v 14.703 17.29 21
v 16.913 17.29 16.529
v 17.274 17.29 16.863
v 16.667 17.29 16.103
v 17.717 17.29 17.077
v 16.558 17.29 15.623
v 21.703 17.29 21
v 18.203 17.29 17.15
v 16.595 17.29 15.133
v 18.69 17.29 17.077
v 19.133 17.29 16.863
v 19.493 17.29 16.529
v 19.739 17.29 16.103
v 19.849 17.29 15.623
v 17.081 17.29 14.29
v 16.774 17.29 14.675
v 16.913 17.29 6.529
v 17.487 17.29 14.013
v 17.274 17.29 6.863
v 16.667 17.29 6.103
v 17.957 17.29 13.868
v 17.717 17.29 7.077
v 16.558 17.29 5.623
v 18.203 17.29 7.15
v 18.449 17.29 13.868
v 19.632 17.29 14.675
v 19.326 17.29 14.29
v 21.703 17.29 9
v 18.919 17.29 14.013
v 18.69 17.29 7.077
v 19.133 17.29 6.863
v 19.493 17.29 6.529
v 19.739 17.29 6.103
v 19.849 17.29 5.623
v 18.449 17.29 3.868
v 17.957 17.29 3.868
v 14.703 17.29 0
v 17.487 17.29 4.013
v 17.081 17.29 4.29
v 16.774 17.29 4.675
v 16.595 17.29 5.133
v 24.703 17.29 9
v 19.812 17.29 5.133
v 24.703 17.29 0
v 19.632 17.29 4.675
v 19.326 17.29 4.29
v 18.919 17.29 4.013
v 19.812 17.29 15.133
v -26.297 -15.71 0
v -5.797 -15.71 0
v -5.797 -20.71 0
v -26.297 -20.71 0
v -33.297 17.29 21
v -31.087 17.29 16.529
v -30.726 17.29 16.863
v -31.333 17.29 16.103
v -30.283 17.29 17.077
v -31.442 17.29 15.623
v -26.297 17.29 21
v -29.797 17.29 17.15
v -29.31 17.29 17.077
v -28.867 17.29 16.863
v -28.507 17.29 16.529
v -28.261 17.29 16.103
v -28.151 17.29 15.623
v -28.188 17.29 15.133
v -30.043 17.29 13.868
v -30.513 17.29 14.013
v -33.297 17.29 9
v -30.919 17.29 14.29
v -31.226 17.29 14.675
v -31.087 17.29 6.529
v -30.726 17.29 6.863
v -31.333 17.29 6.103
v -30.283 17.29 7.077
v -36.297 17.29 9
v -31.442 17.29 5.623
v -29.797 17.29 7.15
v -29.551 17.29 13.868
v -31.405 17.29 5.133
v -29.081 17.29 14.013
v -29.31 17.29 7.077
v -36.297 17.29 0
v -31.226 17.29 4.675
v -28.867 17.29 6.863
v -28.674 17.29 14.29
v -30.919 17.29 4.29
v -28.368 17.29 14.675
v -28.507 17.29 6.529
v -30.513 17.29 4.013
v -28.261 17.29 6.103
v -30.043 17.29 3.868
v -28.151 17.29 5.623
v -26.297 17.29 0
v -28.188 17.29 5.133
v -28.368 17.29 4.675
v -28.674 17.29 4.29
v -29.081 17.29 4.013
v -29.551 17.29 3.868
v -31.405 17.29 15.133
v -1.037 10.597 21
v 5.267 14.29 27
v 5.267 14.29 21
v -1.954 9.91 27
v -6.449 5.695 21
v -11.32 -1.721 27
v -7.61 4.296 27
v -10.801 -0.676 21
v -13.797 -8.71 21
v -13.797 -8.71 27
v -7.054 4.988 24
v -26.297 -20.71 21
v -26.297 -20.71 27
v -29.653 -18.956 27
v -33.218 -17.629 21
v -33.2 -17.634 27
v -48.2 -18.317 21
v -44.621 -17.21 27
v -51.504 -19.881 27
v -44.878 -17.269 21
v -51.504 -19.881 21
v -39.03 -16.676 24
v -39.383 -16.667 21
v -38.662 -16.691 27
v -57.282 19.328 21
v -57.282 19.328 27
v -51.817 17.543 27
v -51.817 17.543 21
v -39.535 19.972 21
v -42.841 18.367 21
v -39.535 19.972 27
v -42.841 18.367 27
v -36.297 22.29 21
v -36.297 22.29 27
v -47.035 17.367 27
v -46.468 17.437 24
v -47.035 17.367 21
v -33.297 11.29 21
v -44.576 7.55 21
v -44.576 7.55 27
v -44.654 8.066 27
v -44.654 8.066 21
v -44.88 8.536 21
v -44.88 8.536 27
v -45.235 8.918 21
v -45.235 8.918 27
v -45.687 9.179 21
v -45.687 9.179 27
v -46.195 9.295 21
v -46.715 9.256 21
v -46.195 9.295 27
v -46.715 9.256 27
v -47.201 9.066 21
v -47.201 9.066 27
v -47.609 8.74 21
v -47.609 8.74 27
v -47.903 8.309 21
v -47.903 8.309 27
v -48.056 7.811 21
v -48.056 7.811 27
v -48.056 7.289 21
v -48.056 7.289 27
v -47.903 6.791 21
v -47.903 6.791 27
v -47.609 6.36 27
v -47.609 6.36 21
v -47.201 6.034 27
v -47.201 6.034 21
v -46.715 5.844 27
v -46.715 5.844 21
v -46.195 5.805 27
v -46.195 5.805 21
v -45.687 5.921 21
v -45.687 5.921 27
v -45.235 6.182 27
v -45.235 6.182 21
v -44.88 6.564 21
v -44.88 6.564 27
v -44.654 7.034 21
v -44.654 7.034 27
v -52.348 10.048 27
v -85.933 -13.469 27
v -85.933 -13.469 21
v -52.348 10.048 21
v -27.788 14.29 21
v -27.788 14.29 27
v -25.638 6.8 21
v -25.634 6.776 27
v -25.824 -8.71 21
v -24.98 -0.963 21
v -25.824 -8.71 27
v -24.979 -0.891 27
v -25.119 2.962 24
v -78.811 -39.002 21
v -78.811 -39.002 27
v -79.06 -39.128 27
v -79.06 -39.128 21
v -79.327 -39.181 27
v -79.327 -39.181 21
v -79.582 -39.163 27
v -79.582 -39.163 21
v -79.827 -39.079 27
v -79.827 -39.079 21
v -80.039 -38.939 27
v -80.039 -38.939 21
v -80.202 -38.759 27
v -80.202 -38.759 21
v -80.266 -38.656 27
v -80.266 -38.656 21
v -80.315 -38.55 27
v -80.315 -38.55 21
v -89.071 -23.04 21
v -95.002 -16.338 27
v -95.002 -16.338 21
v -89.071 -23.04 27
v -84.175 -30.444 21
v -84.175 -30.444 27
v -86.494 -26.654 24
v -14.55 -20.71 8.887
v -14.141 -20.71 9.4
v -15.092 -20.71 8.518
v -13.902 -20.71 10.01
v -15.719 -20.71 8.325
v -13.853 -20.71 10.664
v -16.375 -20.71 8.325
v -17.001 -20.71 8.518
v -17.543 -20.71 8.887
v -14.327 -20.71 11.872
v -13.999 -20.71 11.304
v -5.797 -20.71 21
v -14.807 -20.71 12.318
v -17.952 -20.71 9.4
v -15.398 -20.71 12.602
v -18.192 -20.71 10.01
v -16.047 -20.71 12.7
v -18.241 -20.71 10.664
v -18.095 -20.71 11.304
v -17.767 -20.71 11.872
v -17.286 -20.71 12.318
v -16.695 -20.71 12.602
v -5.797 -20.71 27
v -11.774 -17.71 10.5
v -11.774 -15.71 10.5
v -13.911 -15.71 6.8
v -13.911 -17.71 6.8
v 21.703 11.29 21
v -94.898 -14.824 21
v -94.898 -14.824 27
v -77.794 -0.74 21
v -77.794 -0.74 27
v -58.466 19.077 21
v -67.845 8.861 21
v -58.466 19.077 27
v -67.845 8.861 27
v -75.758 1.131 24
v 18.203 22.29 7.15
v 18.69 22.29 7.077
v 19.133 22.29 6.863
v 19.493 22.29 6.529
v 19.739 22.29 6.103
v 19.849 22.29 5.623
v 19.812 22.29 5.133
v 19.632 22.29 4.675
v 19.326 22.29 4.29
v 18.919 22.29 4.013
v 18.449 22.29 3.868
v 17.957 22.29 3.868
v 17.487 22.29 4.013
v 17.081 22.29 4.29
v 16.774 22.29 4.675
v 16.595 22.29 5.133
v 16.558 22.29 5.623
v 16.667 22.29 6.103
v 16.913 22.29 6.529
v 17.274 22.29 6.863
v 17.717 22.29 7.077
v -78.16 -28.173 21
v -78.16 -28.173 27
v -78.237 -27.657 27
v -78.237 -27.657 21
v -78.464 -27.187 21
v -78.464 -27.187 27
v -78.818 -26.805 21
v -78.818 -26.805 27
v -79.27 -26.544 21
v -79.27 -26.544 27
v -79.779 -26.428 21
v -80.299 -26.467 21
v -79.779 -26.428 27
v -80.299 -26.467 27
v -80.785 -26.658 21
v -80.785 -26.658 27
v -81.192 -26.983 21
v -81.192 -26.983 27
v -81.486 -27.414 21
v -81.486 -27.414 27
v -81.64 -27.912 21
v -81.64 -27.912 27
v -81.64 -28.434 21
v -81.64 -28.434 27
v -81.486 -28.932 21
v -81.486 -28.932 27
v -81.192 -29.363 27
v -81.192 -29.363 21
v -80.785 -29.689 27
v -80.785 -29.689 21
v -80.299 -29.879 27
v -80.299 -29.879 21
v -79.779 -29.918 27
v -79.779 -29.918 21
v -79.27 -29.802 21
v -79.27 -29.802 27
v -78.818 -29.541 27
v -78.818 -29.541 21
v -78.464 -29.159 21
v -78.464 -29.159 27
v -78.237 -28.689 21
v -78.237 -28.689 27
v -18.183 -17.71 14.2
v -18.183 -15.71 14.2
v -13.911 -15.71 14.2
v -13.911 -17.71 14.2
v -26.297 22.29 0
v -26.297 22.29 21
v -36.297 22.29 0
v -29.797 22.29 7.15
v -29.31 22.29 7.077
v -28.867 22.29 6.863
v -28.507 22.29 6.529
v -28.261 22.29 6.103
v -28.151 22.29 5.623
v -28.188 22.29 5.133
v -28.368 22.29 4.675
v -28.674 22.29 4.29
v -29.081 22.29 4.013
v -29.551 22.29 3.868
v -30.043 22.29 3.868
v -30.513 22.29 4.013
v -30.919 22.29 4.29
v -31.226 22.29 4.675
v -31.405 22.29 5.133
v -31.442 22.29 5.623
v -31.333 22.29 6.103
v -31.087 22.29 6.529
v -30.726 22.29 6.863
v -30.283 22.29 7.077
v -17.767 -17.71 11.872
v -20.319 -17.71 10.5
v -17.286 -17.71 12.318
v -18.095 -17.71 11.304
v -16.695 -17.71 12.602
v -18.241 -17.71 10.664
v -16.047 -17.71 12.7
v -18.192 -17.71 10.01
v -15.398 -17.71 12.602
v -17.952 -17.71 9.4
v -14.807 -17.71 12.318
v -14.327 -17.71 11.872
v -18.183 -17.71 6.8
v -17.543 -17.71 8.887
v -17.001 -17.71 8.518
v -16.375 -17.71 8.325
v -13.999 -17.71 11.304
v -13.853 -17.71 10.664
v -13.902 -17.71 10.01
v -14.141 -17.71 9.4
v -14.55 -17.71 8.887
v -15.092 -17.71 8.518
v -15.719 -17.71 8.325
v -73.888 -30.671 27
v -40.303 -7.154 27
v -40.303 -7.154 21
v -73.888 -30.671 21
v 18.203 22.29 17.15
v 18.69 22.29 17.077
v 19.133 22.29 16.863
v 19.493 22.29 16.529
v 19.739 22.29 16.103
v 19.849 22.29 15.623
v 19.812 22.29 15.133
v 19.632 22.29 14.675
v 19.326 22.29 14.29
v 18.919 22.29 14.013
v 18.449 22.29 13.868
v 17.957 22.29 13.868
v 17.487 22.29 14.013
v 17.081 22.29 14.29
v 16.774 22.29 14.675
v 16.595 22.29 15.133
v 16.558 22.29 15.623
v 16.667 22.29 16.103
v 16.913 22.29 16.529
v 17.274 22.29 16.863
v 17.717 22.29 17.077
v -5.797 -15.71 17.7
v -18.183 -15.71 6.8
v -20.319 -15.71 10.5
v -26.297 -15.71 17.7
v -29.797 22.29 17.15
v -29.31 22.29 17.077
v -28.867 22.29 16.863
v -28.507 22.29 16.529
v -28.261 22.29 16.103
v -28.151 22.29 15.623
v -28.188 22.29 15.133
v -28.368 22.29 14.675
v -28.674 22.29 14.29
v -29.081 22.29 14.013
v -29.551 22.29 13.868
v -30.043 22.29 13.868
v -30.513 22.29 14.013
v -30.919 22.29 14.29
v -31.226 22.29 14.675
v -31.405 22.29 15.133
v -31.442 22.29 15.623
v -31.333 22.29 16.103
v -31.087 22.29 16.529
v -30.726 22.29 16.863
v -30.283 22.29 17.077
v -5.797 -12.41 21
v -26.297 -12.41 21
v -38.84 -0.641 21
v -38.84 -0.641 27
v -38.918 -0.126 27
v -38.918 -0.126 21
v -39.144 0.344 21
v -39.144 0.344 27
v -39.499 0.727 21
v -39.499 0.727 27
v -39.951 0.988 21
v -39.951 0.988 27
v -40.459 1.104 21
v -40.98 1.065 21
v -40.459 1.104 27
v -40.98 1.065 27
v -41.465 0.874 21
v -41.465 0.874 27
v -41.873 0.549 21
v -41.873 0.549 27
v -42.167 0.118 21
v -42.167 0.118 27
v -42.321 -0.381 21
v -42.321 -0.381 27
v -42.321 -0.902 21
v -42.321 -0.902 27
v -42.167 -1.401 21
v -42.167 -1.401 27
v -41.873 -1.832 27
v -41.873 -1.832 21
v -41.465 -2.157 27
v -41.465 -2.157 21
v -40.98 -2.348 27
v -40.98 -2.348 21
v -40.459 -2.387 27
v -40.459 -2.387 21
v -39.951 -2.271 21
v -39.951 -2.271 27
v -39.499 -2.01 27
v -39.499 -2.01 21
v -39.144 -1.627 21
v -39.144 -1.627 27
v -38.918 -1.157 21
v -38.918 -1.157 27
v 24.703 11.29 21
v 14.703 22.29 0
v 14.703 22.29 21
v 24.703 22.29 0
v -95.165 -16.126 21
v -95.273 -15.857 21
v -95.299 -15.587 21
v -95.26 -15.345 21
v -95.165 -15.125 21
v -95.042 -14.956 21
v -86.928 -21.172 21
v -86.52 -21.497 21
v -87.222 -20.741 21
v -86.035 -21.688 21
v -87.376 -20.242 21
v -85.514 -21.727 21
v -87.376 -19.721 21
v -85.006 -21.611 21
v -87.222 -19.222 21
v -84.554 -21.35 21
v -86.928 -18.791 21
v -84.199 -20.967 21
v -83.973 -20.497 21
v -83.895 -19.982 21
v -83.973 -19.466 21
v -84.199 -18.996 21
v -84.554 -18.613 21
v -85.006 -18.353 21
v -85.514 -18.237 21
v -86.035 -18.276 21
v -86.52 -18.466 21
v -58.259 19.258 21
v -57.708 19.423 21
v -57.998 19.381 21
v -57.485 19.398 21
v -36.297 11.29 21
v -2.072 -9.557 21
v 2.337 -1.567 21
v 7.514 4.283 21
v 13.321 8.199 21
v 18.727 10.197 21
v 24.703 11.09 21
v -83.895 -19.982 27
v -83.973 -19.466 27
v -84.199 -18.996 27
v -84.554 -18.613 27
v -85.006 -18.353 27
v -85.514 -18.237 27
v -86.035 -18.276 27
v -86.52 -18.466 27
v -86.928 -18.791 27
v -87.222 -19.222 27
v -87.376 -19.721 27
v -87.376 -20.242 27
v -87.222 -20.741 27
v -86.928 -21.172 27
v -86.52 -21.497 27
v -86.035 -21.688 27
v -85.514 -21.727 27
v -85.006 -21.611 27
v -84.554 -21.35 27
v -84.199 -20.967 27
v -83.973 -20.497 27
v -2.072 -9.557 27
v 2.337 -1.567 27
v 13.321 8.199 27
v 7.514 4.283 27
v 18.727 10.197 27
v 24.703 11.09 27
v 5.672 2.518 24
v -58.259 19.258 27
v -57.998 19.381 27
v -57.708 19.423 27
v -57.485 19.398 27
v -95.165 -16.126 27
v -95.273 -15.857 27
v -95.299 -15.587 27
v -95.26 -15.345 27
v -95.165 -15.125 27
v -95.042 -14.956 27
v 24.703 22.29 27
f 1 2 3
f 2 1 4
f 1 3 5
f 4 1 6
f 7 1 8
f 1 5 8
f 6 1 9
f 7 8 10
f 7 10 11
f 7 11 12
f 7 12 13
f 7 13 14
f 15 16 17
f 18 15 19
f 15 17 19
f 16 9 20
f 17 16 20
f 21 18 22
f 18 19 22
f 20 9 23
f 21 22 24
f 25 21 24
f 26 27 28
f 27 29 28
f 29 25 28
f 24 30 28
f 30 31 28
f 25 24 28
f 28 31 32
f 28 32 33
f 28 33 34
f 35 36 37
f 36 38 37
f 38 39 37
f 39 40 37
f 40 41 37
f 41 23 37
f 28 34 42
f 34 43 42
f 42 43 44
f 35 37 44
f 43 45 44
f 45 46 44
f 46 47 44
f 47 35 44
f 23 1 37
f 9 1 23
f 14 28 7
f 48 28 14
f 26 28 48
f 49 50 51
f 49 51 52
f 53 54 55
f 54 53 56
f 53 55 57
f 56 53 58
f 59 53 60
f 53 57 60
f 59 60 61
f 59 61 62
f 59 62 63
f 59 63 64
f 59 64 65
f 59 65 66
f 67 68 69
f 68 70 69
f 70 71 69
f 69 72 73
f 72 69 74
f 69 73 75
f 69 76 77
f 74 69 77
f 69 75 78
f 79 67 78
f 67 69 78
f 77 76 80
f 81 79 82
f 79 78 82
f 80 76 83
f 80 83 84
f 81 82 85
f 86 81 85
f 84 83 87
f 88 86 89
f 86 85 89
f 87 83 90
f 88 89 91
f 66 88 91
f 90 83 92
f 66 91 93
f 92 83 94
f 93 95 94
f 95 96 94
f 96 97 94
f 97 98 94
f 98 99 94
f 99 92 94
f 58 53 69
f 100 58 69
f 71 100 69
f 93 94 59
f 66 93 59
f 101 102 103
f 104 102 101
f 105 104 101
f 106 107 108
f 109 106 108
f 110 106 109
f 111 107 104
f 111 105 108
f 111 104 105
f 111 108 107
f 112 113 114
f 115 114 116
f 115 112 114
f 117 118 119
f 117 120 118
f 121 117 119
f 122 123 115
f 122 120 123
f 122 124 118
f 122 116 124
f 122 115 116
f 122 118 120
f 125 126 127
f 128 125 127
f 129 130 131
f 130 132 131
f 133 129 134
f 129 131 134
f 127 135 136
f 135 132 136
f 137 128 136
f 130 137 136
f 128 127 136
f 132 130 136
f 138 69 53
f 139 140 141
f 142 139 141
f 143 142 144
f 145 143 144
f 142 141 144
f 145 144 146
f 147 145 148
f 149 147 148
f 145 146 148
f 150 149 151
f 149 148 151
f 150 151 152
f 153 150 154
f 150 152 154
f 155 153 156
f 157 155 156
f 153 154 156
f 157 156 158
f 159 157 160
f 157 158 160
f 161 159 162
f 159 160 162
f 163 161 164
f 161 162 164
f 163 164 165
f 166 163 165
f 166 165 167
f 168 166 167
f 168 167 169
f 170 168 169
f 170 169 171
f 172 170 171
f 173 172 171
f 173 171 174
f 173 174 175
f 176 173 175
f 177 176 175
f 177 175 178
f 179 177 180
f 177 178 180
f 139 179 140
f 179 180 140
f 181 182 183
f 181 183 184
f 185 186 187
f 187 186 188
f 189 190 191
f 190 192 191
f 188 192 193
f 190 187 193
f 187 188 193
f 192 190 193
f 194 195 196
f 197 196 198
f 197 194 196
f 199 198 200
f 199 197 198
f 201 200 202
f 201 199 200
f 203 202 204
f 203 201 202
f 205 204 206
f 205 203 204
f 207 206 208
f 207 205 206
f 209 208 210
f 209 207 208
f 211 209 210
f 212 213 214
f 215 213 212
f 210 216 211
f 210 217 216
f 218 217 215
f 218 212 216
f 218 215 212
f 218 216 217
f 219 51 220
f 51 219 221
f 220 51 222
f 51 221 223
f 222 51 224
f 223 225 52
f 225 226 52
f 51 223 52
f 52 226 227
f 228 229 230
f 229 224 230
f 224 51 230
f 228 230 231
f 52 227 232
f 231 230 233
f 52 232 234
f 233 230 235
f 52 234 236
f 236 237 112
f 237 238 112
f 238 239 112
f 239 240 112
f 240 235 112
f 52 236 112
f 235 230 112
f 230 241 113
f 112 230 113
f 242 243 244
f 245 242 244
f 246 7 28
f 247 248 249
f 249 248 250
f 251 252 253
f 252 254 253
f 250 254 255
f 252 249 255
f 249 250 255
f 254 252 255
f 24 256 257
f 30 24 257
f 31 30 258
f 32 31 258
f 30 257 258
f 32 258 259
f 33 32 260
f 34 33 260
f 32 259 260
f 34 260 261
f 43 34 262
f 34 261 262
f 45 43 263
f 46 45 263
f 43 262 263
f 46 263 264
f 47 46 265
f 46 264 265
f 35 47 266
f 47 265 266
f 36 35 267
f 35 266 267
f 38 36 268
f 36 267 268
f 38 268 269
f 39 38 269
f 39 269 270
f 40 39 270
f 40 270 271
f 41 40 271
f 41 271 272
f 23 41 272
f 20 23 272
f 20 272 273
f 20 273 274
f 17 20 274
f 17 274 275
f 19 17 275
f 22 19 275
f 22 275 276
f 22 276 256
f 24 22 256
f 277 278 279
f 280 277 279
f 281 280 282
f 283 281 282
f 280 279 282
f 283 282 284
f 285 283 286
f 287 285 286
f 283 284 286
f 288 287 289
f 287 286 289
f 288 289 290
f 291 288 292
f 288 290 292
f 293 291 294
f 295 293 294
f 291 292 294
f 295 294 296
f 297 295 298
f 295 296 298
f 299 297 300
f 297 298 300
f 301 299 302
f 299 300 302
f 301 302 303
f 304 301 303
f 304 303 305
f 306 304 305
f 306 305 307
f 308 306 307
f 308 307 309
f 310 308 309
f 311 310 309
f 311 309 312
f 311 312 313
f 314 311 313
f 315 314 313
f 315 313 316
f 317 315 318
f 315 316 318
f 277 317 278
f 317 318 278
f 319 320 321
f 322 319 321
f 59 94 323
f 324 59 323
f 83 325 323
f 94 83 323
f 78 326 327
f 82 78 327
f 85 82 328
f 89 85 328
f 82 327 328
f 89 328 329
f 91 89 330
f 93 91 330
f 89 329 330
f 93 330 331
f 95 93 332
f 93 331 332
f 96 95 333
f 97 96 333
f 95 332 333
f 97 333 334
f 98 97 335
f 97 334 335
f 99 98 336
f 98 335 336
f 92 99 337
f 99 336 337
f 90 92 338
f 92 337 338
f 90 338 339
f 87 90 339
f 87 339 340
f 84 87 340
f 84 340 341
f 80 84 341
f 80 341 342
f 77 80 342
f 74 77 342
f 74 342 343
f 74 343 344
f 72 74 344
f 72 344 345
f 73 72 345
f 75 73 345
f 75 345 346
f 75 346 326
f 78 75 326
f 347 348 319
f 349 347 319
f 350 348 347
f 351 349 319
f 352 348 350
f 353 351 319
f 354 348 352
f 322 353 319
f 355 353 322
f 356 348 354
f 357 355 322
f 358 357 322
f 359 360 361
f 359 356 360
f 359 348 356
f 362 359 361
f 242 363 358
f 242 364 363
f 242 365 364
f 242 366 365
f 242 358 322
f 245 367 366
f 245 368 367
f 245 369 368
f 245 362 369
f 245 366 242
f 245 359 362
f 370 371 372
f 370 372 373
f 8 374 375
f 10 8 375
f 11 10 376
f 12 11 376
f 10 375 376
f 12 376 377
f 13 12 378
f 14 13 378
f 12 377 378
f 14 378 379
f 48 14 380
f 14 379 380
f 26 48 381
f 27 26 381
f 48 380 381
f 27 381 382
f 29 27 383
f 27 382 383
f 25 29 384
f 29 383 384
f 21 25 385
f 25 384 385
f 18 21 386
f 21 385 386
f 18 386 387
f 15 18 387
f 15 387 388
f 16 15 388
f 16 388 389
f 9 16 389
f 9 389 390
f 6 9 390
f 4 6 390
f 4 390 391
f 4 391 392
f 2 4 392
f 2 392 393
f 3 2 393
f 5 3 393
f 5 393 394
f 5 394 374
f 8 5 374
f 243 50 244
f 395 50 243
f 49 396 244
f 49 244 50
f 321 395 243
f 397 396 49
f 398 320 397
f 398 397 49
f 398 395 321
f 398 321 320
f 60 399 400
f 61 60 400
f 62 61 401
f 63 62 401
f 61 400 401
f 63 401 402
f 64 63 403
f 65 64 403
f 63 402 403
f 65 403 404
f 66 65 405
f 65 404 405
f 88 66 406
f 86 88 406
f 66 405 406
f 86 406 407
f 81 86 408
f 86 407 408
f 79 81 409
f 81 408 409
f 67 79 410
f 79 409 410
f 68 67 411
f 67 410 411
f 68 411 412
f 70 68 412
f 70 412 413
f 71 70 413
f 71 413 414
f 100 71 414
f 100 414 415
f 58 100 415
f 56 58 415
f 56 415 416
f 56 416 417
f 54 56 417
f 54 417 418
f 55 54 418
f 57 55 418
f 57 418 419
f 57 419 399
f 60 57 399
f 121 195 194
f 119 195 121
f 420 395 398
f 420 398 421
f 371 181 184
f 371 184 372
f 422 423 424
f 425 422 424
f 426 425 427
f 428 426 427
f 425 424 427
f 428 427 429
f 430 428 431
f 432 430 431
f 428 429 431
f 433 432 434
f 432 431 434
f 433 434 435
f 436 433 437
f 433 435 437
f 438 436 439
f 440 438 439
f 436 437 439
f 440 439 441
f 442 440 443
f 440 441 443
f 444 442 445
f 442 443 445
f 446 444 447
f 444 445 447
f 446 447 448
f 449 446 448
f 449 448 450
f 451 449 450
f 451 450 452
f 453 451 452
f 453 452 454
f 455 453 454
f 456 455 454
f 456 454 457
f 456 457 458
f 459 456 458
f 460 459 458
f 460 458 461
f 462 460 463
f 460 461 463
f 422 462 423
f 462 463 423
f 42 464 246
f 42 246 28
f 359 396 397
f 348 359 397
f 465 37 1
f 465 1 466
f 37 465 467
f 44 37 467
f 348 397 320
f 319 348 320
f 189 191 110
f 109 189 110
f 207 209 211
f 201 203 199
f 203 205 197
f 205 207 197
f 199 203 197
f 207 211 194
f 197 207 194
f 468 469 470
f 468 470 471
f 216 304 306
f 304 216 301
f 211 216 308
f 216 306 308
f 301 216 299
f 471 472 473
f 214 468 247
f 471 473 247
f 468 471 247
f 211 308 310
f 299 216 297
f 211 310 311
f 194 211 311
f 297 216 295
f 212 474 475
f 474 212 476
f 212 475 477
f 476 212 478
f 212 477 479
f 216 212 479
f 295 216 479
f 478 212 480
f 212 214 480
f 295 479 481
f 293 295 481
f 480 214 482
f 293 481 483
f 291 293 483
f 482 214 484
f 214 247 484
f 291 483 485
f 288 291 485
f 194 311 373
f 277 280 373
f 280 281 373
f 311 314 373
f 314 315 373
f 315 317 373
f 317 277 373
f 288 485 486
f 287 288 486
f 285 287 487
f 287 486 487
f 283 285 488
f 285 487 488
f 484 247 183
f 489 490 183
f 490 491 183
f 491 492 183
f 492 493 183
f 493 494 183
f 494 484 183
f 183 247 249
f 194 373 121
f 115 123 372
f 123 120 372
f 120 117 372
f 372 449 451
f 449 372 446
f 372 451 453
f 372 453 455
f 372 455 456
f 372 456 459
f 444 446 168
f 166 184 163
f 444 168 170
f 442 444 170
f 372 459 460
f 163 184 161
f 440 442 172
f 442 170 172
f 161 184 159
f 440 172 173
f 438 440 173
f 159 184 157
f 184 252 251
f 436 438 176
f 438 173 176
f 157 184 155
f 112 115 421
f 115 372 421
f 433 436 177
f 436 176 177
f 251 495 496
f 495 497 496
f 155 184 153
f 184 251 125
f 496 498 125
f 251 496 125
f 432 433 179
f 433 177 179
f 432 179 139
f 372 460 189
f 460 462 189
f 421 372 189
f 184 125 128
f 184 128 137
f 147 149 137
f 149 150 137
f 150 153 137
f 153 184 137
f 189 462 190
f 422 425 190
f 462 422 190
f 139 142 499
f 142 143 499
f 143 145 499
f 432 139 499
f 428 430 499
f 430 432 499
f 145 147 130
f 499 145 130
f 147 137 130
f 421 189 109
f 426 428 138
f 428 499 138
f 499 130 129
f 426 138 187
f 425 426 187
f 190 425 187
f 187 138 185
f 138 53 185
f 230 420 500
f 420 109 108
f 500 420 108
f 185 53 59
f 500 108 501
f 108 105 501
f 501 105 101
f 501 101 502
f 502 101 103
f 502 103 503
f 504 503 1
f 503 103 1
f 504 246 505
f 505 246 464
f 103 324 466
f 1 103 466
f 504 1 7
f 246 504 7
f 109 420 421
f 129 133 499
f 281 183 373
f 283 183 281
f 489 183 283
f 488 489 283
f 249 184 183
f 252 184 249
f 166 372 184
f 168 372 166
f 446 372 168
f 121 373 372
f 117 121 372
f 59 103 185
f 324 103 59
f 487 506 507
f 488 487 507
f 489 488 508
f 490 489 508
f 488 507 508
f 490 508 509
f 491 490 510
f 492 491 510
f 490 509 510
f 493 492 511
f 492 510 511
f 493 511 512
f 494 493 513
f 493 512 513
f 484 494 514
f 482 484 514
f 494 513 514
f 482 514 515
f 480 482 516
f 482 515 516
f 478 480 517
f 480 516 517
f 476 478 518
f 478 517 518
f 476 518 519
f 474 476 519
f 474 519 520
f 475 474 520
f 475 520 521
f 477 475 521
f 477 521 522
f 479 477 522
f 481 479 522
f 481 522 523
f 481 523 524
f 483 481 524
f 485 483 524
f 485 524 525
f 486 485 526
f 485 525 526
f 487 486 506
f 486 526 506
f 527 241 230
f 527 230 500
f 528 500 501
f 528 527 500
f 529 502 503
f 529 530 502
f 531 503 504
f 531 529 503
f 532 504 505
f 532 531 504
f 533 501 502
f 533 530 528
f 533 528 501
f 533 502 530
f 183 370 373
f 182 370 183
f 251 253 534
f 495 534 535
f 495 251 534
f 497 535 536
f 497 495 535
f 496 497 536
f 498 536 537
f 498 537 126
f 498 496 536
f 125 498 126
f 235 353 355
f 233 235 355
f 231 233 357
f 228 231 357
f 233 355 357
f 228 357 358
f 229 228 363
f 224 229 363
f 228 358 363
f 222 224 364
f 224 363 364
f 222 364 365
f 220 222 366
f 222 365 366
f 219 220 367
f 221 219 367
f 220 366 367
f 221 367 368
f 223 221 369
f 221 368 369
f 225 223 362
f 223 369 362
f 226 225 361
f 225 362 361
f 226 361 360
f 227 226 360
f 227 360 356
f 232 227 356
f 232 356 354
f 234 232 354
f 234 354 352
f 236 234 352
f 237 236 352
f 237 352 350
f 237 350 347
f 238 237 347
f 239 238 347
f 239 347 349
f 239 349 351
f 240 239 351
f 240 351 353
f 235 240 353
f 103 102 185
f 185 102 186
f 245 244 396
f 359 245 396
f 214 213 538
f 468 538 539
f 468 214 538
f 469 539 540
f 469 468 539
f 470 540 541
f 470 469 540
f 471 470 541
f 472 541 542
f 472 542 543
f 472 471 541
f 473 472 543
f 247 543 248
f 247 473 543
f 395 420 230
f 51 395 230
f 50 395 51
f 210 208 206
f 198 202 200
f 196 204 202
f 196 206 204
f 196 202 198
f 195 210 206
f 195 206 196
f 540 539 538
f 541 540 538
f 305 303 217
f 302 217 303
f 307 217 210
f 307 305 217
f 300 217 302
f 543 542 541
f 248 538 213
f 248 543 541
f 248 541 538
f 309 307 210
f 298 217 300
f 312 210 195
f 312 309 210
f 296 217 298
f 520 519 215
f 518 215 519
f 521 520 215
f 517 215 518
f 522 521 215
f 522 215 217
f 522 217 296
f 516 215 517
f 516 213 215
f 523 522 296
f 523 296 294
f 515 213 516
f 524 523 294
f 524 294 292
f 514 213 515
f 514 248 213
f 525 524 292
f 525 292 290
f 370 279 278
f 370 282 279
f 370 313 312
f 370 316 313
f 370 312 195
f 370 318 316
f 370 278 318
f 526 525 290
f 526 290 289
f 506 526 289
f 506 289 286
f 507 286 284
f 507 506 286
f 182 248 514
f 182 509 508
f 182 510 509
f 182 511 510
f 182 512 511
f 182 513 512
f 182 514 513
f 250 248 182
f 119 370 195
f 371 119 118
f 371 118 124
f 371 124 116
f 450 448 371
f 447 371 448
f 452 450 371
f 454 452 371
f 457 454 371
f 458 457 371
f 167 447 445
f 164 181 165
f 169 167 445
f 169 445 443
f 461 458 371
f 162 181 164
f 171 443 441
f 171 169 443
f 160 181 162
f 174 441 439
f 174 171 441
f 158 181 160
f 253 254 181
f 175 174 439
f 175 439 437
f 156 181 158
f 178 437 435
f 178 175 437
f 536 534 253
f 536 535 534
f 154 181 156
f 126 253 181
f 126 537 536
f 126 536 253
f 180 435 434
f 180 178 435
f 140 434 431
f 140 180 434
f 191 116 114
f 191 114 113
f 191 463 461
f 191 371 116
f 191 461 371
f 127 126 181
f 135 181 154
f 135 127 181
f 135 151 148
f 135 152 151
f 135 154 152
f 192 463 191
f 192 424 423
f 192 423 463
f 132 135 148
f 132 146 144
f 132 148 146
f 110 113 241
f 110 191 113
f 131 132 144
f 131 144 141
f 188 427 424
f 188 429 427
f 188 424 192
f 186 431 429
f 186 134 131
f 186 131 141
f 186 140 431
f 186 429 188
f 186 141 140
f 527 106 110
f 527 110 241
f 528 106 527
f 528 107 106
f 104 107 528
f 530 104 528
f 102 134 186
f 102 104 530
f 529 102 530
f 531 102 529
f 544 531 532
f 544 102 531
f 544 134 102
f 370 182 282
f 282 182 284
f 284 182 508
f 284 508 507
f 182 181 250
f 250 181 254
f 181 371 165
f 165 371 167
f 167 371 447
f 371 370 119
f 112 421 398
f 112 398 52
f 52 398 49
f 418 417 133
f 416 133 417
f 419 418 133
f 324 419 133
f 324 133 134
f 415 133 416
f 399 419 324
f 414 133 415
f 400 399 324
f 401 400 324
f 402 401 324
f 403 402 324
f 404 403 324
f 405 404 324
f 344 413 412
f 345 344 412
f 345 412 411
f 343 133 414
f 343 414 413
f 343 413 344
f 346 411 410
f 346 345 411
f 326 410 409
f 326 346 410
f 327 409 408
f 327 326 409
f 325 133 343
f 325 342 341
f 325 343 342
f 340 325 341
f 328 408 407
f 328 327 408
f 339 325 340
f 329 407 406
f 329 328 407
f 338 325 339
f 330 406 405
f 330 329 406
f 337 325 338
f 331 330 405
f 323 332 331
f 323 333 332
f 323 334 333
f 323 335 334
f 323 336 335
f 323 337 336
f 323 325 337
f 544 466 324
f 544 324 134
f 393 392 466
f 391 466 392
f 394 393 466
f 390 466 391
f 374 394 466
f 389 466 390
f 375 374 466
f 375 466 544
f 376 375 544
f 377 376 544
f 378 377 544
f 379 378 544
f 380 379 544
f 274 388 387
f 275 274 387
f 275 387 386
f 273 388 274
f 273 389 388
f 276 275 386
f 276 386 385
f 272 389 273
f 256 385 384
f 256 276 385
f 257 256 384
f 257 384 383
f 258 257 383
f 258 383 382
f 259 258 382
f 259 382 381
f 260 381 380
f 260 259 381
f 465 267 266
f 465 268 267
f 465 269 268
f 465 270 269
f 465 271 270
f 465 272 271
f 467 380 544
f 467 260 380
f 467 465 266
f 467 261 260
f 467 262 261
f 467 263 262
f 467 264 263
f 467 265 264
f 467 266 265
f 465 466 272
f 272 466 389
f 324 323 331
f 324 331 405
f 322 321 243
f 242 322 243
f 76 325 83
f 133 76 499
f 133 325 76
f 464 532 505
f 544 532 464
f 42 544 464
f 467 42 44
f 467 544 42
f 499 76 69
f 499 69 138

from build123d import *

# Parameters (mm, degrees)
SKETCH1_W             = 10
SKETCH1_H             = 5
BOSS_EXTRUDE1_DEPTH   = 21
BOSS_EXTRUDE1_2_DEPTH = 21
BOSS_EXTRUDE2_DEPTH   = 6
SKETCH3_W             = 20.5
SKETCH3_H             = 5
BOSS_EXTRUDE3_DEPTH   = 21
CUT_EXTRUDE1_REACH    = 64.414
SKETCH4_R             = 1.65
CUT_EXTRUDE2_REACH    = 61.08
SKETCH5_R             = 2.2
SKETCH6_R             = 1.75
BOSS_EXTRUDE4_DEPTH   = 6
CUT_EXTRUDE3_REACH    = 107.857
CUT_EXTRUDE7_REACH    = 109.208
BOSS_EXTRUDE5_DEPTH   = 6
BOSS_EXTRUDE6_DEPTH   = 3
BOSS_EXTRUDE7_DEPTH   = 3
BOSS_EXTRUDE8_DEPTH   = 20.5
CUT_EXTRUDE9_DEPTH    = 6
FILLET1_R             = 1
CUT_EXTRUDE10_DEPTH   = 2


with BuildPart() as part:
    # Sketch1 → Boss-Extrude1 (new body)
    with BuildSketch(Plane.XY):
        with Locations((-31.296703297, 19.79010989)):
            Rectangle(SKETCH1_W, SKETCH1_H)
    extrude(amount=BOSS_EXTRUDE1_DEPTH)



with BuildPart() as body_2:
    # Sketch1 → Boss-Extrude1 2 (new body)
    with BuildSketch(Plane.XY):
        with Locations((19.703296703, 19.79010989)):
            Rectangle(SKETCH1_W, SKETCH1_H)
    extrude(amount=BOSS_EXTRUDE1_2_DEPTH)


with BuildPart() as part_1:
    add(part.part)

    add(body_2.part)  # Boss-Extrude2 merges body 2
    # Sketch2 → Boss-Extrude2 (add)
    with BuildSketch(Plane.XY.offset(21)):
        Polygon((-36.296703297, 22.29010989), (24.703296703, 22.29010989), (24.703296703, 7.29010989), (12.703296703, 7.29010989), (-5.796703297, -11.20989011), (-5.796703297, -20.70989011), (-36.296703297, -20.70989011), align=None)
    extrude(amount=BOSS_EXTRUDE2_DEPTH)

    # Sketch3 → Boss-Extrude3 (add)
    with BuildSketch(Plane(origin=(0, 0, 21), x_dir=(-1, 0, 0), z_dir=(0, 0, -1))):
        with Locations((16.046703297, -18.20989011)):
            Rectangle(SKETCH3_W, SKETCH3_H)
    extrude(amount=BOSS_EXTRUDE3_DEPTH)

    # Sketch4 → Cut-Extrude1 (cut, up to next)
    with BuildSketch(Plane(origin=(0, 22.29010989, 0), x_dir=(1, 0, 0), z_dir=(0, 1, 0)), mode=Mode.PRIVATE) as cut_extrude1_sk1:
        with Locations(Location((-29.796703297, -5.5, 0), (0, 0, 270))):
            Circle(SKETCH4_R)
    cut_extrude1_tool1 = extrude(cut_extrude1_sk1.sketch, amount=-CUT_EXTRUDE1_REACH, mode=Mode.PRIVATE) & part_1.part
    # Sketch4 → Cut-Extrude1 (cut, up to next)
    with BuildSketch(Plane(origin=(0, 22.29010989, 0), x_dir=(1, 0, 0), z_dir=(0, 1, 0)), mode=Mode.PRIVATE) as cut_extrude1_sk2:
        with Locations(Location((18.203296703, -5.5, 0), (0, 0, 270))):
            Circle(SKETCH4_R)
    cut_extrude1_tool2 = extrude(cut_extrude1_sk2.sketch, amount=-CUT_EXTRUDE1_REACH, mode=Mode.PRIVATE) & part_1.part
    # Sketch4 → Cut-Extrude1 (cut, up to next)
    with BuildSketch(Plane(origin=(0, 22.29010989, 0), x_dir=(1, 0, 0), z_dir=(0, 1, 0)), mode=Mode.PRIVATE) as cut_extrude1_sk3:
        with Locations(Location((18.203296703, -15.5, 0), (0, 0, 270))):
            Circle(SKETCH4_R)
    cut_extrude1_tool3 = extrude(cut_extrude1_sk3.sketch, amount=-CUT_EXTRUDE1_REACH, mode=Mode.PRIVATE) & part_1.part
    # Sketch4 → Cut-Extrude1 (cut, up to next)
    with BuildSketch(Plane(origin=(0, 22.29010989, 0), x_dir=(1, 0, 0), z_dir=(0, 1, 0)), mode=Mode.PRIVATE) as cut_extrude1_sk4:
        with Locations(Location((-29.796703297, -15.5, 0), (0, 0, 270))):
            Circle(SKETCH4_R)
    cut_extrude1_tool4 = extrude(cut_extrude1_sk4.sketch, amount=-CUT_EXTRUDE1_REACH, mode=Mode.PRIVATE) & part_1.part
    add(cut_extrude1_tool1.solids().sort_by_distance((-29.796703, 22.29011, 5.5))[0], mode=Mode.SUBTRACT)
    add(cut_extrude1_tool2.solids().sort_by_distance((18.203297, 22.29011, 5.5))[0], mode=Mode.SUBTRACT)
    add(cut_extrude1_tool3.solids().sort_by_distance((18.203297, 22.29011, 15.5))[0], mode=Mode.SUBTRACT)
    add(cut_extrude1_tool4.solids().sort_by_distance((-29.796703, 22.29011, 15.5))[0], mode=Mode.SUBTRACT)

    # Sketch5 → Cut-Extrude2 (cut, up to next)
    with BuildSketch(Plane(origin=(0, -15.70989011, 0), x_dir=(1, 0, 0), z_dir=(0, 1, 0)), mode=Mode.PRIVATE) as cut_extrude2_sk1:
        with Locations(Location((-16.046703297, -10.5, 0), (0, 0, 270))):
            Circle(SKETCH5_R)
    cut_extrude2_tool1 = extrude(cut_extrude2_sk1.sketch, amount=-CUT_EXTRUDE2_REACH, mode=Mode.PRIVATE) & part_1.part
    add(cut_extrude2_tool1.solids().sort_by_distance((-16.046703, -15.70989, 10.5))[0], mode=Mode.SUBTRACT)

    # Sketch6 → Boss-Extrude4 (add)
    with BuildSketch(Plane.XY.offset(27)):
        with BuildLine():
            Line((-79.859138265, -39.735236509), (-51.503727763, -19.880564327))
            add(Edge.make_bspline(
                [(-51.503727763, -19.880564327), (-43.777944292, -18.491061957), (-36.296703297, -20.70989011)],
                knots=[0, 0, 0, 1, 1, 1], degree=2))
            Line((-36.296703297, -20.70989011), (-36.296703297, 22.29010989))
            add(Edge.make_bspline(
                [(-57.962836939, 19.661219133), (-46.447122218, 13.814864777), (-36.296703297, 22.29010989)],
                knots=[0, 0, 0, 1, 1, 1], degree=2))
            add(Edge.make_bspline(
                [(-95.842115451, -15.524174544), (-74.909238175, -0.080881368), (-57.962836939, 19.661219133)],
                knots=[0, 0, 0, 1, 1, 1], degree=2))
            add(Edge.make_bspline(
                [(-95.842115451, -15.524174544), (-85.086697095, -25.754599345), (-79.859138265, -39.735236509)],
                knots=[0, 0, 0, 1, 1, 1], degree=2))
        make_face()
        with Locations((-40.590214383, -0.641481396)):
            Circle(SKETCH6_R, mode=Mode.SUBTRACT)
        with Locations((-85.645276872, -19.981629898)):
            Circle(SKETCH6_R, mode=Mode.SUBTRACT)
        with Locations((-79.909512508, -28.173150341)):
            Circle(SKETCH6_R, mode=Mode.SUBTRACT)
        with Locations((-46.325978746, 7.550039047)):
            Circle(SKETCH6_R, mode=Mode.SUBTRACT)
        Polygon((-85.932915117, -13.468776127), (-52.347681301, 10.047857763), (-40.302576138, -7.154335167), (-73.887809953, -30.670969058), align=None, mode=Mode.SUBTRACT)
    extrude(amount=-BOSS_EXTRUDE4_DEPTH)

    # Sketch7 → Cut-Extrude3 (cut, up to next)
    with BuildSketch(Plane(origin=(0, 0, 21), x_dir=(-1, 0, 0), z_dir=(0, 0, -1)), mode=Mode.PRIVATE) as cut_extrude3_sk1:
        with BuildLine():
            Line((36.296703297, -20.70989011), (26.296703297, -20.70989011))
            add(Edge.make_bspline(
                [(26.296703297, -20.70989011), (39.15974316, -13.056772406), (51.503727763, -19.880564327)],
                knots=[0, 0, 0, 1, 1, 1], degree=2))
            add(Edge.make_bspline(
                [(51.503727763, -19.880564327), (43.777944292, -18.491061957), (36.296703297, -20.70989011)],
                knots=[0, 0, 0, 1, 1, 1], degree=2))
        make_face()
    cut_extrude3_tool1 = extrude(cut_extrude3_sk1.sketch, amount=-CUT_EXTRUDE3_REACH, mode=Mode.PRIVATE) & part_1.part
    add(cut_extrude3_tool1.solids().sort_by_distance((-38.072503, -18.786508, 21))[0], mode=Mode.SUBTRACT)

    # Sketch10 → Cut-Extrude7 (cut, up to next)
    with BuildSketch(Plane.XY.offset(27), mode=Mode.PRIVATE) as cut_extrude7_sk1:
        with BuildLine():
            Line((5.266834936, 14.29010989), (-27.788194587, 14.29010989))
            add(Edge.make_bspline(
                [(-27.788194587, 14.29010989), (-23.431396766, 3.132914333), (-25.823714091, -8.70989011)],
                knots=[0, 0, 0, 1, 1, 1], degree=2))
            Line((-25.823714091, -8.70989011), (-13.796703297, -8.70989011))
            add(Edge.make_bspline(
                [(5.266834936, 14.29010989), (-9.842167425, 7.185288479), (-13.796703297, -8.70989011)],
                knots=[0, 0, 0, 1, 1, 1], degree=2))
        make_face()
    cut_extrude7_tool1 = extrude(cut_extrude7_sk1.sketch, amount=-CUT_EXTRUDE7_REACH, mode=Mode.PRIVATE) & part_1.part
    add(cut_extrude7_tool1.solids().sort_by_distance((-15.764918, 4.836925, 27))[0], mode=Mode.SUBTRACT)

    # Sketch11 → Boss-Extrude5 (add)
    with BuildSketch(Plane.XY.offset(27)):
        with BuildLine():
            Line((15.119169314, 7.29010989), (12.703296703, 7.29010989))
            Line((12.703296703, 7.29010989), (-5.796703297, -11.20989011))
            Line((-5.796703297, -11.20989011), (-5.796703297, -20.70989011))
            add(Edge.make_bspline(
                [(-5.796703297, -20.70989011), (-0.06692684, -3.022661062), (15.119169314, 7.29010989)],
                knots=[0, 0, 0, 1, 1, 1], degree=2))
        make_face()
    extrude(amount=-BOSS_EXTRUDE5_DEPTH)

    # Sketch12 → Boss-Extrude6 (add)
    with BuildSketch(Plane(origin=(24.703296703, 0, 0), x_dir=(0, 0, -1), z_dir=(1, 0, 0))):
        Polygon((-21, 11.29010989), (-9, 17.29010989), (-21, 17.29010989), align=None)
    extrude(amount=-BOSS_EXTRUDE6_DEPTH)

    # Sketch13 → Boss-Extrude7 (add)
    with BuildSketch(Plane.ZY.offset(36.296703297)):
        Polygon((21, 11.29010989), (21, 17.29010989), (9, 17.29010989), align=None)
    extrude(amount=-BOSS_EXTRUDE7_DEPTH)

    # Sketch14 → Boss-Extrude8 (add)
    with BuildSketch(Plane(origin=(-5.796703297, 0, 0), x_dir=(0, 0, -1), z_dir=(1, 0, 0))):
        Polygon((-17.7, -15.70989011), (-21, -12.40989011), (-21, -15.70989011), align=None)
    extrude(amount=-BOSS_EXTRUDE8_DEPTH)

    # Sketch15 → Cut-Extrude9 (cut)
    with BuildSketch(Plane.XY.offset(27)):
        with BuildLine():
            Line((24.703296703, 7.29010989), (24.703296703, 11.09010989))
            add(Edge.make_bspline(
                [(-5.796703297, -20.70989011), (1.890928929, 9.845343686), (24.703296703, 11.09010989)],
                knots=[0, 0, 0, 1, 1, 1], degree=2))
            add(Edge.make_bspline(
                [(-5.796703297, -20.70989011), (-0.06692684, -3.022661062), (15.119169314, 7.29010989)],
                knots=[0, 0, 0, 1, 1, 1], degree=2))
            Line((15.119169314, 7.29010989), (24.703296703, 7.29010989))
        make_face()
    extrude(amount=-CUT_EXTRUDE9_DEPTH, mode=Mode.SUBTRACT)

    # Fillet1
    fillet1_edges = [part_1.edges().sort_by_distance(p)[0] for p in [
        (-95.842115451, -15.524174544, 24),
        (-57.962836939, 19.661219133, 24),
        (-79.859138265, -39.735236509, 24),
    ]]
    fillet(fillet1_edges, radius=FILLET1_R)

    # Sketch16 → Cut-Extrude10 (cut)
    with BuildSketch(Plane(origin=(0, -15.70989011, 0), x_dir=(1, 0, 0), z_dir=(0, 1, 0))):
        Polygon((-13.910507301, -6.8), (-18.182899293, -6.8), (-20.319095289, -10.5), (-18.182899293, -14.2), (-13.910507301, -14.2), (-11.774311305, -10.5), align=None)
    extrude(amount=-CUT_EXTRUDE10_DEPTH, mode=Mode.SUBTRACT)


solid = part_1.part
